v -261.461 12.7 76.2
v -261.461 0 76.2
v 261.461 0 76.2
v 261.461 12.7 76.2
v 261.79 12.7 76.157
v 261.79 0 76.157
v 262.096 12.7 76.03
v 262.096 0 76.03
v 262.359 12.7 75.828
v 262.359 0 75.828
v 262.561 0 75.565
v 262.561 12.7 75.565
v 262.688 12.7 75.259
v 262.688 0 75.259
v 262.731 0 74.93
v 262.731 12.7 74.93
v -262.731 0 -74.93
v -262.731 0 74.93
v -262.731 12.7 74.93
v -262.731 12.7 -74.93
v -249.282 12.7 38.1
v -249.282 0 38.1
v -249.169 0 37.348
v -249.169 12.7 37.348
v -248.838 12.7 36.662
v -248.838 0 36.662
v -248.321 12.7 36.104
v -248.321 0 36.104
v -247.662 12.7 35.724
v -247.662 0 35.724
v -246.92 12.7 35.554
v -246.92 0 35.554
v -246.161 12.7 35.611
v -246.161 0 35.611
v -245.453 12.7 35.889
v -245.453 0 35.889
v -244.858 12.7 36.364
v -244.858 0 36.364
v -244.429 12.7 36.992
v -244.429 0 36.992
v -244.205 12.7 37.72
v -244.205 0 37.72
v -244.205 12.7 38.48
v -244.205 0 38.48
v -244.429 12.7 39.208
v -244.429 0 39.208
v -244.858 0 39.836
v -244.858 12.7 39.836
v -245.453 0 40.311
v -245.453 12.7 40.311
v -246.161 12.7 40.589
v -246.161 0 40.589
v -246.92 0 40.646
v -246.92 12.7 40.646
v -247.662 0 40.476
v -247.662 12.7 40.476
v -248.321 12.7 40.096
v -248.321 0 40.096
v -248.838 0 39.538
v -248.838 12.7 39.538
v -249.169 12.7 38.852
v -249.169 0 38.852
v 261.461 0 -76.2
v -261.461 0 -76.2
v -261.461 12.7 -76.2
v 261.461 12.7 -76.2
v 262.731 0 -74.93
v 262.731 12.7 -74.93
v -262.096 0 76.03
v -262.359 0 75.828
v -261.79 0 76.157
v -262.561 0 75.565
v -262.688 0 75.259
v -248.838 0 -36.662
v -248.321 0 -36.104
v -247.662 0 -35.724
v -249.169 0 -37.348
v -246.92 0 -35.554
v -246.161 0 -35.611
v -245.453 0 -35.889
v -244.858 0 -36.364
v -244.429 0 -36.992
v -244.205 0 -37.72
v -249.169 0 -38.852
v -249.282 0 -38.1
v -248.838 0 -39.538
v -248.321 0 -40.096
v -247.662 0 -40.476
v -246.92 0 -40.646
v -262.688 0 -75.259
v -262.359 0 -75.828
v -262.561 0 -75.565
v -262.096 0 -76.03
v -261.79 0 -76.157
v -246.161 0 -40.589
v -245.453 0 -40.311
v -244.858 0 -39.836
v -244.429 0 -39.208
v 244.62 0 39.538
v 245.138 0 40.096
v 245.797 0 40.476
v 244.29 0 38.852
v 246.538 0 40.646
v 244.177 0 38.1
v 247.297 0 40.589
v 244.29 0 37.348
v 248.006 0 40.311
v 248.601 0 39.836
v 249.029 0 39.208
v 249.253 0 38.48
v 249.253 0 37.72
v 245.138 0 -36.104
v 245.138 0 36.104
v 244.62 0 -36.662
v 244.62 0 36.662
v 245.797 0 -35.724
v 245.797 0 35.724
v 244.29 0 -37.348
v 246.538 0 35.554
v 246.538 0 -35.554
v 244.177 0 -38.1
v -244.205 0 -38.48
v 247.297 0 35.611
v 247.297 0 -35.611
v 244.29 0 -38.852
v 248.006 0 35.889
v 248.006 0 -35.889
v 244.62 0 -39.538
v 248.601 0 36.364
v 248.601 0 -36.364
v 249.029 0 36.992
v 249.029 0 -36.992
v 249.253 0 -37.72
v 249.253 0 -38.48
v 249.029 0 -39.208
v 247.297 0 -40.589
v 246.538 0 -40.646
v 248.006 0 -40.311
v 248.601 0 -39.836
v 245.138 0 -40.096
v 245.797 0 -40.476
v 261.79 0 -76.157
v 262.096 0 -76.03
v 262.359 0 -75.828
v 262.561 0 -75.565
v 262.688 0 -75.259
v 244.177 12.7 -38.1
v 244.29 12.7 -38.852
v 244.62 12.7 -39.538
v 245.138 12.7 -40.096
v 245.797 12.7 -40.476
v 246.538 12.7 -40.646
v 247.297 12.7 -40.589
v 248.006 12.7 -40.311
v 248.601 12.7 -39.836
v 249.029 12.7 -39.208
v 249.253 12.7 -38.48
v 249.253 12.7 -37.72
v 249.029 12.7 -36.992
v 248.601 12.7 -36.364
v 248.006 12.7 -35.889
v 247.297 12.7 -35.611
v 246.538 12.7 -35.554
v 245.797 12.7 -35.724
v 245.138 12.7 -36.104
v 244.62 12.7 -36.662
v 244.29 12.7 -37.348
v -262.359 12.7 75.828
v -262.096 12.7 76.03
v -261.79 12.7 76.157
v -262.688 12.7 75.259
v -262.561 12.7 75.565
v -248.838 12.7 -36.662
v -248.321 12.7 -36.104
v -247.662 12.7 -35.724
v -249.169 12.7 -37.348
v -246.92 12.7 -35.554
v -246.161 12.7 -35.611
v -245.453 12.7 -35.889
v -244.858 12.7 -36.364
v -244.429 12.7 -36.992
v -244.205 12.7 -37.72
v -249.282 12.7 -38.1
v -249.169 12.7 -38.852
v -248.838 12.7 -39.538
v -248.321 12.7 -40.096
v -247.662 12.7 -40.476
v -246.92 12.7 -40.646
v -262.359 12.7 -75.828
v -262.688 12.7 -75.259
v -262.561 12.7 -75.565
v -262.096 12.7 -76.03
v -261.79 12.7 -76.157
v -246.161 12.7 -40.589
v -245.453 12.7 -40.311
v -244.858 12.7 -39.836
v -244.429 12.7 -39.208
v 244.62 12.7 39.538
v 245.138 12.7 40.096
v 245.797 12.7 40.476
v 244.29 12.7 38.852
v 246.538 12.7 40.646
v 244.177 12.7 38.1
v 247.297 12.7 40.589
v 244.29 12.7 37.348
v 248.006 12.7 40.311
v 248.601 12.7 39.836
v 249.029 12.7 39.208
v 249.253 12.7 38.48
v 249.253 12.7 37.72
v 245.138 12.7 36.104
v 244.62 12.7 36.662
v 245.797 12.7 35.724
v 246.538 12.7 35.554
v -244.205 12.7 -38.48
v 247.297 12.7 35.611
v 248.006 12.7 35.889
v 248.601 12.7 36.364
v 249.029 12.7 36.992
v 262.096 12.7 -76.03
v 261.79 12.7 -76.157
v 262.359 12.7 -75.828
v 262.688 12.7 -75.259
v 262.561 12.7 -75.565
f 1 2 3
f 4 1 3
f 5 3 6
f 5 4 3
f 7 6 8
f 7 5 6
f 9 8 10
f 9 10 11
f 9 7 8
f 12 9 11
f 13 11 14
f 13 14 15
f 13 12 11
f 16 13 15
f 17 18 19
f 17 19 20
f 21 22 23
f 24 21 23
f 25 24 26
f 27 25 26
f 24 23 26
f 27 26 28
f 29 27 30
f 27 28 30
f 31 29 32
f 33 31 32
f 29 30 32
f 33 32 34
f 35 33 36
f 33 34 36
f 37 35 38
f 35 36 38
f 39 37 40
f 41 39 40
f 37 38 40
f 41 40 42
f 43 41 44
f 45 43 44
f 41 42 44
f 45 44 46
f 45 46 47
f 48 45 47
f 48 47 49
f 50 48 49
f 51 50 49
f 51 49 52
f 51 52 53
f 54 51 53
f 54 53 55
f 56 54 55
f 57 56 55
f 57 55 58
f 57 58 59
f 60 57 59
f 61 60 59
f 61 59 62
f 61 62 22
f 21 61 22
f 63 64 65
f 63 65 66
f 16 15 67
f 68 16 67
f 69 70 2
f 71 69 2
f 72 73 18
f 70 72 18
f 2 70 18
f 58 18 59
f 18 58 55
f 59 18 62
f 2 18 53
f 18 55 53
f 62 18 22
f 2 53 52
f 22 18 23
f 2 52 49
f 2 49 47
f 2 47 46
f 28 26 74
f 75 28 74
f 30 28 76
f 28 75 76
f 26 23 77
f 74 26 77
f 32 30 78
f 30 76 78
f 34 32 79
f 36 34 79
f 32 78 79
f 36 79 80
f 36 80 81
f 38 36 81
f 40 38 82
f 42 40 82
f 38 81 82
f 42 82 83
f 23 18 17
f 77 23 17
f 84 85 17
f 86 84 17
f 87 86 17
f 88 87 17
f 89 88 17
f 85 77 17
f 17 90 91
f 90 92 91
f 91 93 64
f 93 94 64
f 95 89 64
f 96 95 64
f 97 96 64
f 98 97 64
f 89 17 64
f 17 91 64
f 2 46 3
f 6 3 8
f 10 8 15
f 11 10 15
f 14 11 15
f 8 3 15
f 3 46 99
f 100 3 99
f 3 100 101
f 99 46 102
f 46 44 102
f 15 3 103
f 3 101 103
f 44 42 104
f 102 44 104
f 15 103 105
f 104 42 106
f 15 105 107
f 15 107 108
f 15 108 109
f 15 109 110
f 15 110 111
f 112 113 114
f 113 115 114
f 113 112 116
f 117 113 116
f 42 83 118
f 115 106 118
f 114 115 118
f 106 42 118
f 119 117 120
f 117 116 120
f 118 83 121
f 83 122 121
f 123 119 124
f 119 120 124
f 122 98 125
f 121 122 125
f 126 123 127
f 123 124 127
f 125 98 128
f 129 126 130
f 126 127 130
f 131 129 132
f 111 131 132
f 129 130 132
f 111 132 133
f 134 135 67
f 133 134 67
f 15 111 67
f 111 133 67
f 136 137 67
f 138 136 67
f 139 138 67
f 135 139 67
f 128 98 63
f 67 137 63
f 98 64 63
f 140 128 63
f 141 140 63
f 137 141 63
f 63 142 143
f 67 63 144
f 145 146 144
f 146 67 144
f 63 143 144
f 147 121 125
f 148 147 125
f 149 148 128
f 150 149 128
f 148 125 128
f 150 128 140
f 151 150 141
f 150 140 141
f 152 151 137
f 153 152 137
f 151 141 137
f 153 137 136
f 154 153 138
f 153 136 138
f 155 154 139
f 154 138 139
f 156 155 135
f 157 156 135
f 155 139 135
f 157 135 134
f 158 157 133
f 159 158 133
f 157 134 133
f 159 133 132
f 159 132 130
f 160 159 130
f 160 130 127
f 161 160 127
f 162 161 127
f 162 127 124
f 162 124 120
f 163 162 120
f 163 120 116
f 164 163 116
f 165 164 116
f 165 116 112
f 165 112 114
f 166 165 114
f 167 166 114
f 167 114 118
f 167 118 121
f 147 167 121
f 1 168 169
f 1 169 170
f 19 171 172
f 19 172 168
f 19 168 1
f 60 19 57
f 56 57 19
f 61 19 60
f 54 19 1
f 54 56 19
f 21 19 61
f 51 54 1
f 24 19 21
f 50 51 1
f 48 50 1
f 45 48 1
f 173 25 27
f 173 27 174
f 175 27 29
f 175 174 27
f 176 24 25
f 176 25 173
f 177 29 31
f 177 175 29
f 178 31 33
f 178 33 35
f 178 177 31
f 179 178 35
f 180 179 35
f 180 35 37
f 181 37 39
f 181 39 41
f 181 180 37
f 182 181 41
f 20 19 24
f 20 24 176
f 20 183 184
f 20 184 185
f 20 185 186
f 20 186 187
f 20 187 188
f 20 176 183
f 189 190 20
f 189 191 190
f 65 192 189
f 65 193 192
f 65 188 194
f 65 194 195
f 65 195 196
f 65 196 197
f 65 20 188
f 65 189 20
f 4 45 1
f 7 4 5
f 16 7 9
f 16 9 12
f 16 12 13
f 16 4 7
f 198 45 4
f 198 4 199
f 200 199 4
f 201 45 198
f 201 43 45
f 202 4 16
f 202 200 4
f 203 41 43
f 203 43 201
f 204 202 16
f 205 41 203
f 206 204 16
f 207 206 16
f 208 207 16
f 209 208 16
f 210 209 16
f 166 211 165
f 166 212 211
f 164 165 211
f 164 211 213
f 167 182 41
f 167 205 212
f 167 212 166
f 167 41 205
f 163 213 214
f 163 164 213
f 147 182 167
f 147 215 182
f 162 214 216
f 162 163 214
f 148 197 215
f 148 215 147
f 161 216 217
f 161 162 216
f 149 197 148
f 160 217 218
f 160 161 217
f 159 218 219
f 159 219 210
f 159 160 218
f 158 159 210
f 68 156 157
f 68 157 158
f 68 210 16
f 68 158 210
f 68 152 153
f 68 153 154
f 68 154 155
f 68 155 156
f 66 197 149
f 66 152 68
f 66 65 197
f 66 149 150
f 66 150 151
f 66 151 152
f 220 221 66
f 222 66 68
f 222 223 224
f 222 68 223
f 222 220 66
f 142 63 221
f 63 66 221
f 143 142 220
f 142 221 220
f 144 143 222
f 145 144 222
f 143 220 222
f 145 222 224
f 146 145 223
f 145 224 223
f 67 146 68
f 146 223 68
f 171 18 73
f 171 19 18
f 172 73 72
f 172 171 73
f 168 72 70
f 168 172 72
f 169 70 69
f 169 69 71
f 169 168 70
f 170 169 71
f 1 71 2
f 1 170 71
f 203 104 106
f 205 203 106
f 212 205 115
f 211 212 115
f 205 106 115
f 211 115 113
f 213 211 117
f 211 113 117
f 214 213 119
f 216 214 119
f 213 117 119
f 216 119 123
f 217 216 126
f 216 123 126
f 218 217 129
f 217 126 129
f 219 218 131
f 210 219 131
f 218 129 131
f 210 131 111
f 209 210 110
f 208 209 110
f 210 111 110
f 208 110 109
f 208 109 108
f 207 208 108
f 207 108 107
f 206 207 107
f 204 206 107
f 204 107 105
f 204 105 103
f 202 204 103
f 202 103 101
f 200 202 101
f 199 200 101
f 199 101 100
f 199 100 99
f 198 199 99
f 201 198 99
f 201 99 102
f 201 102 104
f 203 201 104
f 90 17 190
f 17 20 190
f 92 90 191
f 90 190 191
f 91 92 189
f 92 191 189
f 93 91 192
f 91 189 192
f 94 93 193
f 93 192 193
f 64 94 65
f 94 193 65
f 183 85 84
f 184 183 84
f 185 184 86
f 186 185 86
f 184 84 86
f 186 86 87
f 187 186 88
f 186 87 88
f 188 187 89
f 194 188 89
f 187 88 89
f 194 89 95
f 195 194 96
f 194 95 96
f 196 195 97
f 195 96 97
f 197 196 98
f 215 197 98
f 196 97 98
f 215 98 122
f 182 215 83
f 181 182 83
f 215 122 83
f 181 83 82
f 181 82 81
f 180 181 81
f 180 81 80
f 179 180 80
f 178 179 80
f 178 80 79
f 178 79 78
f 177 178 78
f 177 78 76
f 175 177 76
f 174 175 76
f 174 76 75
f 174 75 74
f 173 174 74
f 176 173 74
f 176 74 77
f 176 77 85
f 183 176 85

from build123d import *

# Parameters (mm, degrees)
SKETCH1_W              = 525.4625
SKETCH1_H              = 152.4
BOSS_EXTRUDE1_DEPTH    = 12.7
F_10_CLEARANCE_HOLE1_D = 5.1054
FILLET1_R              = 1.27


with BuildPart() as part:
    # Sketch1 → Boss-Extrude1 (new body)
    with BuildSketch(Plane(origin=(0, 0, 0), x_dir=(1, 0, 0), z_dir=(0, 1, 0))):
        Rectangle(SKETCH1_W, SKETCH1_H)
    extrude(amount=BOSS_EXTRUDE1_DEPTH)

    # #10 Clearance Hole1 (through all)
    with Locations(Plane(origin=(0, 12.7, 0), x_dir=(1, 0, 0), z_dir=(0, 1, 0))):
        with Locations((246.72925, -38.1), (-246.72925, 38.1), (-246.72925, -38.1), (246.72925, 38.1)):
            Hole(F_10_CLEARANCE_HOLE1_D / 2)

    # Fillet1
    fillet1_edges = [part.edges().sort_by_distance(p)[0] for p in [
        (262.73125, 6.35, 76.2),
        (-262.73125, 6.35, 76.2),
        (-262.73125, 6.35, -76.2),
        (262.73125, 6.35, -76.2),
    ]]
    fillet(fillet1_edges, radius=FILLET1_R)


solid = part.part
